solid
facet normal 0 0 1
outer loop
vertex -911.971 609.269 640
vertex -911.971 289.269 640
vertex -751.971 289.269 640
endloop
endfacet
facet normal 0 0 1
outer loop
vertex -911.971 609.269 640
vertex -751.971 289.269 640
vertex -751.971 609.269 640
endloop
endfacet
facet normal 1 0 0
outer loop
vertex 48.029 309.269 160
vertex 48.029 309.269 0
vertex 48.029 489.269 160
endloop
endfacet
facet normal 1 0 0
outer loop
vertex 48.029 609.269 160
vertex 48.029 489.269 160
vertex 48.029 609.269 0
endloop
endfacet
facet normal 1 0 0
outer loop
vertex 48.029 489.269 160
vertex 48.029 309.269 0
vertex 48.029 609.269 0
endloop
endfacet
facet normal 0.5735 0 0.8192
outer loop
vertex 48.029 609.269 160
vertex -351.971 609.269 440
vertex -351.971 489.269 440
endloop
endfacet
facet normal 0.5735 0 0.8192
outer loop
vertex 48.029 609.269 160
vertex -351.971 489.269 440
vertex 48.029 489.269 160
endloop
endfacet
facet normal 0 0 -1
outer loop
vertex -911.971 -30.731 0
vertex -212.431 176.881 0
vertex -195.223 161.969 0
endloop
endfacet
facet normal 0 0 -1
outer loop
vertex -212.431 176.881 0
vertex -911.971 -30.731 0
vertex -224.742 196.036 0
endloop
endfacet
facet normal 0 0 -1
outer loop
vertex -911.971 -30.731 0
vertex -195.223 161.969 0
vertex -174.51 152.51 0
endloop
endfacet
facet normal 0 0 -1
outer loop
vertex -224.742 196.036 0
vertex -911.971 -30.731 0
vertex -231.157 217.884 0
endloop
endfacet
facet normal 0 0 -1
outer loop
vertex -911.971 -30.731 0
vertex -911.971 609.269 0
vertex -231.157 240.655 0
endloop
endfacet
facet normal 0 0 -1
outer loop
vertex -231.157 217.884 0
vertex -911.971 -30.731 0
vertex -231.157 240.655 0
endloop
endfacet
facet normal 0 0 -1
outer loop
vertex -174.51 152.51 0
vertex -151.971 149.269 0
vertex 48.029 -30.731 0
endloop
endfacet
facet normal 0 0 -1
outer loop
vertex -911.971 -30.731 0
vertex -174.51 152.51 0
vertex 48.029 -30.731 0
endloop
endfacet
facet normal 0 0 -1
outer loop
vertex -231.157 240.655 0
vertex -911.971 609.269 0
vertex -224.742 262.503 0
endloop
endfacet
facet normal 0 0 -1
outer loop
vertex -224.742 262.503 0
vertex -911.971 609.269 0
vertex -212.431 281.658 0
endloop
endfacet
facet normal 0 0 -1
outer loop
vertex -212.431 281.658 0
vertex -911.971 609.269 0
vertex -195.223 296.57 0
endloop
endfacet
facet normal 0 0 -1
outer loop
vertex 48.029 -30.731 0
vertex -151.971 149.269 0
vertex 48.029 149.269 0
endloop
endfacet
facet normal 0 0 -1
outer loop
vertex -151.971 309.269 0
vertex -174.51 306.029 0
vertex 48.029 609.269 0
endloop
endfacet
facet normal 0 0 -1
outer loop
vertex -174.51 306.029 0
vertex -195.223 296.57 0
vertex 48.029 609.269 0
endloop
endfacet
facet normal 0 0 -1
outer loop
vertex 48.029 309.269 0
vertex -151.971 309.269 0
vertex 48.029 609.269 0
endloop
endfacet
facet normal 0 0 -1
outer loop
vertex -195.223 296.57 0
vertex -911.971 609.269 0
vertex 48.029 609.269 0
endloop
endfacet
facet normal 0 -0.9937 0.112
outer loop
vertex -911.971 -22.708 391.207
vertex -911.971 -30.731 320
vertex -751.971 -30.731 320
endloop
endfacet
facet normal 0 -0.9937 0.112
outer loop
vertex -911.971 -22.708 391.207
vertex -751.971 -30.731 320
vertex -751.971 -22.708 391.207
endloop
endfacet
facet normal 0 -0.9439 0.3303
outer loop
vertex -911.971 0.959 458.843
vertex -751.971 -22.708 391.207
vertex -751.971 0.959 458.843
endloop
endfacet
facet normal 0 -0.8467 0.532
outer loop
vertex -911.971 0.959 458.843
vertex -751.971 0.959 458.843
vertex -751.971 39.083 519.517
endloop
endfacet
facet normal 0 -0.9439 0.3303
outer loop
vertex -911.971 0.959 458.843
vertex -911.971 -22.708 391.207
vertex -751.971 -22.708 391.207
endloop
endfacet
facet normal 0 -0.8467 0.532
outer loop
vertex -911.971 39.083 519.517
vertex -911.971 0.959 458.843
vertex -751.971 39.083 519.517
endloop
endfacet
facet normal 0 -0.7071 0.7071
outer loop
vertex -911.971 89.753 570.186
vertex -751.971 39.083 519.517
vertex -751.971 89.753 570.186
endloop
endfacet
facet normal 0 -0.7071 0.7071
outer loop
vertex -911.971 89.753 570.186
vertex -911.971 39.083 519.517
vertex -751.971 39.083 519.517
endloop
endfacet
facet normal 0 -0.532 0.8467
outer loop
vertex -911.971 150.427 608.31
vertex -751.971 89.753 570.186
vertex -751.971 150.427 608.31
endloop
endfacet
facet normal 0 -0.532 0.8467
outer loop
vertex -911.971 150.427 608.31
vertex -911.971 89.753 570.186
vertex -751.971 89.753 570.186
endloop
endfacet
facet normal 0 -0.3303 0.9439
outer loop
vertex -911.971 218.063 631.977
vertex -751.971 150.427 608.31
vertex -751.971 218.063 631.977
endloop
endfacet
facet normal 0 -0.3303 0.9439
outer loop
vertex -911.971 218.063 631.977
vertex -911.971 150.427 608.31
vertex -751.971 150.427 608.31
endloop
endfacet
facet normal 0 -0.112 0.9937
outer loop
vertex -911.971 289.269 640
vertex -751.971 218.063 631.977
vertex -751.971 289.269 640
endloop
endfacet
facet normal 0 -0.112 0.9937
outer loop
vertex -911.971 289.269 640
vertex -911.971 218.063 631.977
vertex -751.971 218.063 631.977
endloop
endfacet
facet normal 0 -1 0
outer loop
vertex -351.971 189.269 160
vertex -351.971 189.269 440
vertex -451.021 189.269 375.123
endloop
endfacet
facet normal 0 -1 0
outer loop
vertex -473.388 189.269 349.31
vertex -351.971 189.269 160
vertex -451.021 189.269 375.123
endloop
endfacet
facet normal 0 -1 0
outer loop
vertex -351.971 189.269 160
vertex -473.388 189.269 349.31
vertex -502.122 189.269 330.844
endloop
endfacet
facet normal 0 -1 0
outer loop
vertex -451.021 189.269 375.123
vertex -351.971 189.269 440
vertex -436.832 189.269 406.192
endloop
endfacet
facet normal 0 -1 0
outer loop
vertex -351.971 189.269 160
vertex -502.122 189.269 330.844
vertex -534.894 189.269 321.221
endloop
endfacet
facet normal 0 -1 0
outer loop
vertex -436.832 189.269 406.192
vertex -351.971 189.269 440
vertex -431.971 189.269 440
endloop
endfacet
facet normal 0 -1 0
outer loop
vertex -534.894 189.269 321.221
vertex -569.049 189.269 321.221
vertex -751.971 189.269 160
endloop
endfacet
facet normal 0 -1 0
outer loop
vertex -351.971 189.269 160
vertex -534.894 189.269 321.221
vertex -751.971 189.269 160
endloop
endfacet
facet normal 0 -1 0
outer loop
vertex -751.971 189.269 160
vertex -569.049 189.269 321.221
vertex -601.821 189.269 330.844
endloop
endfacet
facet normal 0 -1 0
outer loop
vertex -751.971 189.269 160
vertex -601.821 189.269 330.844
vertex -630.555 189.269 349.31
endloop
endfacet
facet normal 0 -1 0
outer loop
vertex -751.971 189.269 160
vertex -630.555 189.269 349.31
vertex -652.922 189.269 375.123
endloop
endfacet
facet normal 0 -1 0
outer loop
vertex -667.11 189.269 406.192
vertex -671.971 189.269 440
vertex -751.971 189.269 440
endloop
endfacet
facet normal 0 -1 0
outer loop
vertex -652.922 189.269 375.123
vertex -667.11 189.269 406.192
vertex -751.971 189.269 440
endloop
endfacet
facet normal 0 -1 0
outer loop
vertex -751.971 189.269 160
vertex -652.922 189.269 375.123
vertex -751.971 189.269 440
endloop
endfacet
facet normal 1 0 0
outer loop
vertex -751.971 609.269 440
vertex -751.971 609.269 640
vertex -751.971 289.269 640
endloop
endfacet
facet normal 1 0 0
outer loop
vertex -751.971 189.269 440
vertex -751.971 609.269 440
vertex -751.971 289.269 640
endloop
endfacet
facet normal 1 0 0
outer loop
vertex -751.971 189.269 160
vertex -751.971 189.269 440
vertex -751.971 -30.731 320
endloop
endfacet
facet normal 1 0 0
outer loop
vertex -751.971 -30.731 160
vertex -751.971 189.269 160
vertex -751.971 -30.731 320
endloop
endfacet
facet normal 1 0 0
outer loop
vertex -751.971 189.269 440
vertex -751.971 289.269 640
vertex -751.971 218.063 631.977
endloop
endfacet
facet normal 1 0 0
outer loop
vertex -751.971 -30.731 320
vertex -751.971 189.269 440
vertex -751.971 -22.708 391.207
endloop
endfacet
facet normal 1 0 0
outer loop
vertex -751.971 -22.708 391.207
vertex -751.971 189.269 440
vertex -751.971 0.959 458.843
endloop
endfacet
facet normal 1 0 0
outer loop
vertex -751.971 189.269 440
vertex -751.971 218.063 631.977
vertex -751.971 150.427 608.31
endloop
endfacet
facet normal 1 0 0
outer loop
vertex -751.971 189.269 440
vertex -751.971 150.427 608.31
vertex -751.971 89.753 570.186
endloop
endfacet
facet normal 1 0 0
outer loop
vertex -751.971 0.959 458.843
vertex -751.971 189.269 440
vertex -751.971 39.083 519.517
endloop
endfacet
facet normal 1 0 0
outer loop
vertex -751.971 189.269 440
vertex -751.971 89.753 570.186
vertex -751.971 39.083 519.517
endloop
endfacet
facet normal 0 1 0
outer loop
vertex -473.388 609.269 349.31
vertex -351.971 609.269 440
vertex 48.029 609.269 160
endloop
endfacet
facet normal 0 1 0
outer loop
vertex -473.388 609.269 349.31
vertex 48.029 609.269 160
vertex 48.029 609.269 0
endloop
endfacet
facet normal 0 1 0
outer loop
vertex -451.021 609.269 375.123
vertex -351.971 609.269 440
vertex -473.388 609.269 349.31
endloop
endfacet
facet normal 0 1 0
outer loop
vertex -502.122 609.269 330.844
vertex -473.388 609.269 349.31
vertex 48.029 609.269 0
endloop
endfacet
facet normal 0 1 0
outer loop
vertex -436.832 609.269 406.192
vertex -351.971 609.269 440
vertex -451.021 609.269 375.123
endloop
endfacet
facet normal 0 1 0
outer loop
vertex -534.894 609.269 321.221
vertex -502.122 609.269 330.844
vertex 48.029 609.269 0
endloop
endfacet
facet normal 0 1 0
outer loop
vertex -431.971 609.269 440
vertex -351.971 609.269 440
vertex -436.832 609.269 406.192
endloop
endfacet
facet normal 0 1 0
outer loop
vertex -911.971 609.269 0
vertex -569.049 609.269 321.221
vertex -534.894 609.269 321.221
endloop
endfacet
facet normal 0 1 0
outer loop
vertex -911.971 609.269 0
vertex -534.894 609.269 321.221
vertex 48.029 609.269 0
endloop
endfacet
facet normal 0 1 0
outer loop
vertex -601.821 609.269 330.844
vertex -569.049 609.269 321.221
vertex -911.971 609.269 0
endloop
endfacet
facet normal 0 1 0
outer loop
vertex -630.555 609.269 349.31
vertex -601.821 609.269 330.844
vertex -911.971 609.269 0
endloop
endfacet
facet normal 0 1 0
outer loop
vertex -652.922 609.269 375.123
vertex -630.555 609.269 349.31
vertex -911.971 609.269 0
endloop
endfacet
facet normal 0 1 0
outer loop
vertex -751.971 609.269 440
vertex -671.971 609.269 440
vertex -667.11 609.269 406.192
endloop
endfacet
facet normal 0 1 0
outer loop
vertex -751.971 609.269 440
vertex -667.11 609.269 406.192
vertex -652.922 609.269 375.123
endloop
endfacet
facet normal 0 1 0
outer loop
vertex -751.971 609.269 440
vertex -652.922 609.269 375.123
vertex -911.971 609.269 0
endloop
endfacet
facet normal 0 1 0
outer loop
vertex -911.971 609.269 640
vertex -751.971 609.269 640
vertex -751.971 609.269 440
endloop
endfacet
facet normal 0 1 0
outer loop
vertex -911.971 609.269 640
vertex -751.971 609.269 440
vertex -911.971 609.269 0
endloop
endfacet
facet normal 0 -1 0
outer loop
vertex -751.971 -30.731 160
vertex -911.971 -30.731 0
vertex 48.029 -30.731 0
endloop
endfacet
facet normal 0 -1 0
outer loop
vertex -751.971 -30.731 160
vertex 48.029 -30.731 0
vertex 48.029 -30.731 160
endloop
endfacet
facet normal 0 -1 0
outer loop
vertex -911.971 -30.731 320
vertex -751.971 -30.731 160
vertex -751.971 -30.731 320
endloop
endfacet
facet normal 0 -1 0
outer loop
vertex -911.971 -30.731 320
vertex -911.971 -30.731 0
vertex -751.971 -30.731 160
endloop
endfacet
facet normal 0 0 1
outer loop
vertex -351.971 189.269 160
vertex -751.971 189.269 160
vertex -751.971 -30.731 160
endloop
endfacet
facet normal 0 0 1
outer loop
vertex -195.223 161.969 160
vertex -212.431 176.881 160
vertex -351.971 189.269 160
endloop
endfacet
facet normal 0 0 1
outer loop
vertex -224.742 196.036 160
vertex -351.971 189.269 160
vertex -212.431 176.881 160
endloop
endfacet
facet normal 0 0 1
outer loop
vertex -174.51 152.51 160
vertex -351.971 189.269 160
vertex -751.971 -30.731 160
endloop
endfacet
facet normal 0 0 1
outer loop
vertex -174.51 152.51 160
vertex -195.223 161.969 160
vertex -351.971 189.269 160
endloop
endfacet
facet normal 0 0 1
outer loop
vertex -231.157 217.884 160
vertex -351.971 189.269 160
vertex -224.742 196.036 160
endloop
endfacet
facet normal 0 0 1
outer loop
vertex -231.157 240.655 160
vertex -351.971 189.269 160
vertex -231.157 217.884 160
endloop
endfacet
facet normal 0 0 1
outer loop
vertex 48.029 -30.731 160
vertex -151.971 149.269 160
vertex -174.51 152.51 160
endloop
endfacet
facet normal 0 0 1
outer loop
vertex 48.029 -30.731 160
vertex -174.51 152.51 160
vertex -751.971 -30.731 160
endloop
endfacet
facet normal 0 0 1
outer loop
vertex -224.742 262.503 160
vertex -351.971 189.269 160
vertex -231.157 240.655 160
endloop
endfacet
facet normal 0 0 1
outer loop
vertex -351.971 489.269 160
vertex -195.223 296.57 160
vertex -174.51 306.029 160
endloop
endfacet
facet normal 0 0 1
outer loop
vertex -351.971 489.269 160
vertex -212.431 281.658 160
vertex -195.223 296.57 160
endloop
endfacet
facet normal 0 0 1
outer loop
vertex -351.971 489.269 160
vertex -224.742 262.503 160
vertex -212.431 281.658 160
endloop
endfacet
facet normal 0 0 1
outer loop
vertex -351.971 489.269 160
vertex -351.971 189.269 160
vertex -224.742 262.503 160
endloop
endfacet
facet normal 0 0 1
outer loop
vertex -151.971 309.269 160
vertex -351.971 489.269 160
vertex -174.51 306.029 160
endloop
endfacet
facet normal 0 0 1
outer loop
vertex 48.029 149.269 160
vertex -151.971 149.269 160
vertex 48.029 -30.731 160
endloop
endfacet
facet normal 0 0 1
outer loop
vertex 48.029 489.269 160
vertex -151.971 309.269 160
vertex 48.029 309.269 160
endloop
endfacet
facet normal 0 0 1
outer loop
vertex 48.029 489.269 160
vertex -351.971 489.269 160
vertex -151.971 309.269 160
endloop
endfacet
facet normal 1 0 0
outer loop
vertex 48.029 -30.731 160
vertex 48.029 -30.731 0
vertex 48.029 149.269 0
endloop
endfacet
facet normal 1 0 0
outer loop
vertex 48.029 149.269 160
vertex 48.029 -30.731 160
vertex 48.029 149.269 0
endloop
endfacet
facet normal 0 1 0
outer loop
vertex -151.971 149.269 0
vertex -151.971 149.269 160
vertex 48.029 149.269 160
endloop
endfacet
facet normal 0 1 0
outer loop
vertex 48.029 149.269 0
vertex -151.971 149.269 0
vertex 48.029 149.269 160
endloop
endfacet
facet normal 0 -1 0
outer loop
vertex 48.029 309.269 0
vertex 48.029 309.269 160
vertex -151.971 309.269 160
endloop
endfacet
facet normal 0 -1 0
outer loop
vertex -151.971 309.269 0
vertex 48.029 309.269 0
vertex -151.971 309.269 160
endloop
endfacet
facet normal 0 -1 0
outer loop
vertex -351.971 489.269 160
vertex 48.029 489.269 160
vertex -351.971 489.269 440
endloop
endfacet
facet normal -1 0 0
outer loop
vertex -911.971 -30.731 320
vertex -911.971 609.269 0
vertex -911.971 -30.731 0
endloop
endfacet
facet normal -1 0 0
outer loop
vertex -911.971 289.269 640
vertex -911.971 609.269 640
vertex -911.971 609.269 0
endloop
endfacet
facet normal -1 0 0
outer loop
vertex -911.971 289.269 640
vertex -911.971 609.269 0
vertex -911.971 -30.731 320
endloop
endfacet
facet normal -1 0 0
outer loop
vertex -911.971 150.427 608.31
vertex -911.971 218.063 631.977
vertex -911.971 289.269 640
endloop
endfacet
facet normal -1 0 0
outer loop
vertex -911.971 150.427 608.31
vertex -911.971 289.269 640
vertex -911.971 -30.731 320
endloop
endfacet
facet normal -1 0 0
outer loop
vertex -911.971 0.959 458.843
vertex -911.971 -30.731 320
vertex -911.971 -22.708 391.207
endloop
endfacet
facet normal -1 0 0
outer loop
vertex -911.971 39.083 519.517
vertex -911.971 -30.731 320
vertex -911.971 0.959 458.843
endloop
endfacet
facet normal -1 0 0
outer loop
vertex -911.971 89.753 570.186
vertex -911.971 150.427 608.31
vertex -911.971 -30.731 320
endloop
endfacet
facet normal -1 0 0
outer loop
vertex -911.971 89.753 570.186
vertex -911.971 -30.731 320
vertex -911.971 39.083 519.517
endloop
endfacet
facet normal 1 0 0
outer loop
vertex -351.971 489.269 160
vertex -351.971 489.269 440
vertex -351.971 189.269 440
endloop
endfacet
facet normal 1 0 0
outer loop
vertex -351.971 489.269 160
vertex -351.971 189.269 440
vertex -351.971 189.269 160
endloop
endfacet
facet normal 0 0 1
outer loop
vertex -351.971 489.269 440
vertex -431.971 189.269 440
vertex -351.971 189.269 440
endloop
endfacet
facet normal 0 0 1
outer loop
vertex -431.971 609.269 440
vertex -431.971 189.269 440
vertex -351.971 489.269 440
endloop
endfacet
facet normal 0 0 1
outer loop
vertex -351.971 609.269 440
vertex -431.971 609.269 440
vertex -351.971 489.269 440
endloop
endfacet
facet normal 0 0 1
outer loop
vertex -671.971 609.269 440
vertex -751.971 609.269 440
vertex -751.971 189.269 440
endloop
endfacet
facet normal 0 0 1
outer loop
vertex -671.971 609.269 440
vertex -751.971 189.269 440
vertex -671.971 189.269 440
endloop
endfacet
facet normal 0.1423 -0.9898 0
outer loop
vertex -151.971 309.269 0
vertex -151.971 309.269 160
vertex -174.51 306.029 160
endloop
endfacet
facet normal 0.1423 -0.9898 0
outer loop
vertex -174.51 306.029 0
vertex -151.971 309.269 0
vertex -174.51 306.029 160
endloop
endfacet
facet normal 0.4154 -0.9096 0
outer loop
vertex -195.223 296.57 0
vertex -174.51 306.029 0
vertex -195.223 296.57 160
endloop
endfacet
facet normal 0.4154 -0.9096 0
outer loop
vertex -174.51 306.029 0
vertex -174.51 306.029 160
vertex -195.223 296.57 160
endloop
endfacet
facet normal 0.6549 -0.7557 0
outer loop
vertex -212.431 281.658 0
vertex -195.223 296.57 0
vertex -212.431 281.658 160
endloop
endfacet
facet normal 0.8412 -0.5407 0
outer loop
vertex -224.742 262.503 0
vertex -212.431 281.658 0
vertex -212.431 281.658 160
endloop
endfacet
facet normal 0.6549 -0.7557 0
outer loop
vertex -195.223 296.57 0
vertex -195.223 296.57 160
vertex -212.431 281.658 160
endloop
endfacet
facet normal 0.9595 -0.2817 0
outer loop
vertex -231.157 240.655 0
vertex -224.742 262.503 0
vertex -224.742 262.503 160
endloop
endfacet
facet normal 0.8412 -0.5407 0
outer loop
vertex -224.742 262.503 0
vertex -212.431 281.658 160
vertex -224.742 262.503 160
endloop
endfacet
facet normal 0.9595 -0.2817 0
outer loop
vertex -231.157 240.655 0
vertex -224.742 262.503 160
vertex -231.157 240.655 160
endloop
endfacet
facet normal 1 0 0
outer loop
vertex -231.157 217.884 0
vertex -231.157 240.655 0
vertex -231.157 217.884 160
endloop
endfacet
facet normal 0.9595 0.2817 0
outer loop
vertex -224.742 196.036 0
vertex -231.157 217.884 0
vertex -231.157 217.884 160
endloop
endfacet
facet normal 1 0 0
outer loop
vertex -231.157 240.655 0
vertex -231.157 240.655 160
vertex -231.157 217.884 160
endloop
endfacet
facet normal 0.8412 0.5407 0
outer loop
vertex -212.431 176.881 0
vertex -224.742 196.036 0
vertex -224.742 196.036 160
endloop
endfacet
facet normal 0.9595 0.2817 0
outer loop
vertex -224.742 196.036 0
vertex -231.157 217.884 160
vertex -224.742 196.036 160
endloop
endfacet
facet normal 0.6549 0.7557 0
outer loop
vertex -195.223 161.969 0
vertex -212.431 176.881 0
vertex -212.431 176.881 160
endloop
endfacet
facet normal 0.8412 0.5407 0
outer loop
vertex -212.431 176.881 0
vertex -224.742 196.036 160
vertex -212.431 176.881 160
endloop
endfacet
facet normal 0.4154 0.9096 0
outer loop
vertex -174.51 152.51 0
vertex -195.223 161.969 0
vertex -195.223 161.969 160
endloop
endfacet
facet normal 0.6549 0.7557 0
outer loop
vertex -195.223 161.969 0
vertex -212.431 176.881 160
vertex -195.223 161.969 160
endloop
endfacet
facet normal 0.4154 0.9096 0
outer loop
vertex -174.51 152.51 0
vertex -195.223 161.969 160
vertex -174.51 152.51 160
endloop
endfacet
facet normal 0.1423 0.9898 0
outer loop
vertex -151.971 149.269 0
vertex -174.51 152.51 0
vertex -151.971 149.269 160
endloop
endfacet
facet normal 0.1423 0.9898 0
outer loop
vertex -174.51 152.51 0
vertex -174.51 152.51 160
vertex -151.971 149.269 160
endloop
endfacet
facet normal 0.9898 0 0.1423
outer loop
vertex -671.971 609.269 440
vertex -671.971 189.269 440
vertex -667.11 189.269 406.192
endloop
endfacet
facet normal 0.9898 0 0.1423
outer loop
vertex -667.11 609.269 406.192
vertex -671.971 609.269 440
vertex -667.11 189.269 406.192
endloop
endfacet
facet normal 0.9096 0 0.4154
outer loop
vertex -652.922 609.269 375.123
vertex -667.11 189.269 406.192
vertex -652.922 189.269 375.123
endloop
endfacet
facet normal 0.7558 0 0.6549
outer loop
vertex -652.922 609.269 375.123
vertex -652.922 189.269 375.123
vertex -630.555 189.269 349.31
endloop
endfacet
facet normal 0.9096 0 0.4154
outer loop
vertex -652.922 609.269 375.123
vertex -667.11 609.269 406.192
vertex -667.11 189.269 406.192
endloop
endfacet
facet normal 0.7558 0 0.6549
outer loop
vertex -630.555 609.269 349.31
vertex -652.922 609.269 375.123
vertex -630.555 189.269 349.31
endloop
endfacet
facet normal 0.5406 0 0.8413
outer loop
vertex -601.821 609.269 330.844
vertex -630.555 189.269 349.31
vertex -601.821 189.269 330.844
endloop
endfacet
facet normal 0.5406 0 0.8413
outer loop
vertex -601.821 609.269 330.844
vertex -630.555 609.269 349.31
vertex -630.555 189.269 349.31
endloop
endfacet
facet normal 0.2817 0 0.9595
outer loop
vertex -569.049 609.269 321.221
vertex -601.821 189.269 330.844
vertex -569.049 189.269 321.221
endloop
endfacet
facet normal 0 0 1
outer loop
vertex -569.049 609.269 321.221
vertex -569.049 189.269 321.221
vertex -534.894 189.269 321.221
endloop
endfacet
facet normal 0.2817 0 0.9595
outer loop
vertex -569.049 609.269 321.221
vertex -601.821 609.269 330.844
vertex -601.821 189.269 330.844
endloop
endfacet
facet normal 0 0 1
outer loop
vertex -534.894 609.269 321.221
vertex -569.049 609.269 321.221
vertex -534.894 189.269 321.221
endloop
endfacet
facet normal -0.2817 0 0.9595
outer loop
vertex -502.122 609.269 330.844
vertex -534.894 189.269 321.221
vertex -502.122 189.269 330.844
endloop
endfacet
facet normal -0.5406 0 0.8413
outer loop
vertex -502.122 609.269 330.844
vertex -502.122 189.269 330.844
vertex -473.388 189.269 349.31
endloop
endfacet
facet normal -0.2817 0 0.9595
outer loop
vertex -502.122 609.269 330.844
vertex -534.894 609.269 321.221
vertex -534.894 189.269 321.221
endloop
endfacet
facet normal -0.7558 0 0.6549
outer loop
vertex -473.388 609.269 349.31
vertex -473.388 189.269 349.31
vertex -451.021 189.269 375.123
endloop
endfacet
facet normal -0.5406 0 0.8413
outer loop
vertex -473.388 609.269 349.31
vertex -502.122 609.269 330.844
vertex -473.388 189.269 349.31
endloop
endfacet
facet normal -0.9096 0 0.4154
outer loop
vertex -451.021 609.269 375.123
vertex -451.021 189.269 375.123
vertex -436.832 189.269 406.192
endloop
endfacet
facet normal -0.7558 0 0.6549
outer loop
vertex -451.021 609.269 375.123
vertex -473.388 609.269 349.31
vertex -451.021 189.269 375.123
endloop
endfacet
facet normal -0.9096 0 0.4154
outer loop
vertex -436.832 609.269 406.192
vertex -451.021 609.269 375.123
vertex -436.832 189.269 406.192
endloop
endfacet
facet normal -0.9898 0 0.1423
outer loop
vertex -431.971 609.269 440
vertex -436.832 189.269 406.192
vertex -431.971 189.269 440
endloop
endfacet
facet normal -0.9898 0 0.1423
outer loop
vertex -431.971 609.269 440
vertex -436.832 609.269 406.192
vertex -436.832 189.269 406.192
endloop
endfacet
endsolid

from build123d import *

# Parameters (mm, degrees)
F0_W     = 960
F0_H     = 640
F1_DEPTH = 160
F3_DEPTH = 160
F5_DEPTH = 120
F7_DEPTH = 420
F9_DEPTH = 160


with BuildPart() as f1:
    # F0 (on Top) → F1 (new body)
    with BuildSketch(Plane.XY):
        with Locations((-431.9713334739, 289.2694023252)):
            Rectangle(F0_W, F0_H)
    extrude(amount=F1_DEPTH)

    # F2 (on face) → F3 (join)
    with BuildSketch(Plane(origin=(-911.9713334739, 0, 0), x_dir=(0, -1, 0), z_dir=(-1, 0, 0))):
        with BuildLine():
            Line((-609.2694023252, 640), (-609.2694023252, 160))
            Line((-609.2694023252, 160), (30.7305976748, 160))
            Line((30.7305976748, 160), (30.7305976748, 320))
            ThreePointArc((30.7305976748, 320), (-62.9952323455, 546.2741699797), (-289.2694023252, 640))
            Line((-289.2694023252, 640), (-609.2694023252, 640))
        make_face()
    extrude(amount=-F3_DEPTH)

    # F4 (on face) → F5 (join)
    with BuildSketch(Plane(origin=(0, 609.2694023252, 0), x_dir=(-1, 0, 0), z_dir=(0, 1, 0))):
        Polygon((-48.0286665261, 160), (351.9713334739, 160), (351.9713334739, 440), align=None)
    extrude(amount=-F5_DEPTH)

    # F6 (on face) → F7 (join)
    with BuildSketch(Plane(origin=(0, 609.2694023252, 0), x_dir=(-1, 0, 0), z_dir=(0, 1, 0))):
        with BuildLine():
            Line((431.9713334739, 440), (351.9713334739, 440))
            Line((351.9713334739, 440), (351.9713334739, 160))
            Line((351.9713334739, 160), (751.9713334739, 160))
            Line((751.9713334739, 160), (751.9713334739, 440))
            Line((751.9713334739, 440), (671.9713334739, 440))
            ThreePointArc((671.9713334739, 440), (551.9713334739, 320), (431.9713334739, 440))
        make_face()
    extrude(amount=-F7_DEPTH)

    # F8 (on face) → F9 (cut)
    with BuildSketch(Plane.XY.offset(160)):
        with BuildLine():
            Line((-151.9713334739, 149.2694023252), (48.0286665261, 149.2694023252))
            Line((48.0286665261, 149.2694023252), (48.0286665261, 309.2694023252))
            Line((48.0286665261, 309.2694023252), (-151.9713334739, 309.2694023252))
            ThreePointArc((-151.9713334739, 309.2694023252), (-231.9713334739, 229.2694023252), (-151.9713334739, 149.2694023252))
        make_face()
    extrude(amount=-F9_DEPTH, mode=Mode.SUBTRACT)


solid = f1.part
